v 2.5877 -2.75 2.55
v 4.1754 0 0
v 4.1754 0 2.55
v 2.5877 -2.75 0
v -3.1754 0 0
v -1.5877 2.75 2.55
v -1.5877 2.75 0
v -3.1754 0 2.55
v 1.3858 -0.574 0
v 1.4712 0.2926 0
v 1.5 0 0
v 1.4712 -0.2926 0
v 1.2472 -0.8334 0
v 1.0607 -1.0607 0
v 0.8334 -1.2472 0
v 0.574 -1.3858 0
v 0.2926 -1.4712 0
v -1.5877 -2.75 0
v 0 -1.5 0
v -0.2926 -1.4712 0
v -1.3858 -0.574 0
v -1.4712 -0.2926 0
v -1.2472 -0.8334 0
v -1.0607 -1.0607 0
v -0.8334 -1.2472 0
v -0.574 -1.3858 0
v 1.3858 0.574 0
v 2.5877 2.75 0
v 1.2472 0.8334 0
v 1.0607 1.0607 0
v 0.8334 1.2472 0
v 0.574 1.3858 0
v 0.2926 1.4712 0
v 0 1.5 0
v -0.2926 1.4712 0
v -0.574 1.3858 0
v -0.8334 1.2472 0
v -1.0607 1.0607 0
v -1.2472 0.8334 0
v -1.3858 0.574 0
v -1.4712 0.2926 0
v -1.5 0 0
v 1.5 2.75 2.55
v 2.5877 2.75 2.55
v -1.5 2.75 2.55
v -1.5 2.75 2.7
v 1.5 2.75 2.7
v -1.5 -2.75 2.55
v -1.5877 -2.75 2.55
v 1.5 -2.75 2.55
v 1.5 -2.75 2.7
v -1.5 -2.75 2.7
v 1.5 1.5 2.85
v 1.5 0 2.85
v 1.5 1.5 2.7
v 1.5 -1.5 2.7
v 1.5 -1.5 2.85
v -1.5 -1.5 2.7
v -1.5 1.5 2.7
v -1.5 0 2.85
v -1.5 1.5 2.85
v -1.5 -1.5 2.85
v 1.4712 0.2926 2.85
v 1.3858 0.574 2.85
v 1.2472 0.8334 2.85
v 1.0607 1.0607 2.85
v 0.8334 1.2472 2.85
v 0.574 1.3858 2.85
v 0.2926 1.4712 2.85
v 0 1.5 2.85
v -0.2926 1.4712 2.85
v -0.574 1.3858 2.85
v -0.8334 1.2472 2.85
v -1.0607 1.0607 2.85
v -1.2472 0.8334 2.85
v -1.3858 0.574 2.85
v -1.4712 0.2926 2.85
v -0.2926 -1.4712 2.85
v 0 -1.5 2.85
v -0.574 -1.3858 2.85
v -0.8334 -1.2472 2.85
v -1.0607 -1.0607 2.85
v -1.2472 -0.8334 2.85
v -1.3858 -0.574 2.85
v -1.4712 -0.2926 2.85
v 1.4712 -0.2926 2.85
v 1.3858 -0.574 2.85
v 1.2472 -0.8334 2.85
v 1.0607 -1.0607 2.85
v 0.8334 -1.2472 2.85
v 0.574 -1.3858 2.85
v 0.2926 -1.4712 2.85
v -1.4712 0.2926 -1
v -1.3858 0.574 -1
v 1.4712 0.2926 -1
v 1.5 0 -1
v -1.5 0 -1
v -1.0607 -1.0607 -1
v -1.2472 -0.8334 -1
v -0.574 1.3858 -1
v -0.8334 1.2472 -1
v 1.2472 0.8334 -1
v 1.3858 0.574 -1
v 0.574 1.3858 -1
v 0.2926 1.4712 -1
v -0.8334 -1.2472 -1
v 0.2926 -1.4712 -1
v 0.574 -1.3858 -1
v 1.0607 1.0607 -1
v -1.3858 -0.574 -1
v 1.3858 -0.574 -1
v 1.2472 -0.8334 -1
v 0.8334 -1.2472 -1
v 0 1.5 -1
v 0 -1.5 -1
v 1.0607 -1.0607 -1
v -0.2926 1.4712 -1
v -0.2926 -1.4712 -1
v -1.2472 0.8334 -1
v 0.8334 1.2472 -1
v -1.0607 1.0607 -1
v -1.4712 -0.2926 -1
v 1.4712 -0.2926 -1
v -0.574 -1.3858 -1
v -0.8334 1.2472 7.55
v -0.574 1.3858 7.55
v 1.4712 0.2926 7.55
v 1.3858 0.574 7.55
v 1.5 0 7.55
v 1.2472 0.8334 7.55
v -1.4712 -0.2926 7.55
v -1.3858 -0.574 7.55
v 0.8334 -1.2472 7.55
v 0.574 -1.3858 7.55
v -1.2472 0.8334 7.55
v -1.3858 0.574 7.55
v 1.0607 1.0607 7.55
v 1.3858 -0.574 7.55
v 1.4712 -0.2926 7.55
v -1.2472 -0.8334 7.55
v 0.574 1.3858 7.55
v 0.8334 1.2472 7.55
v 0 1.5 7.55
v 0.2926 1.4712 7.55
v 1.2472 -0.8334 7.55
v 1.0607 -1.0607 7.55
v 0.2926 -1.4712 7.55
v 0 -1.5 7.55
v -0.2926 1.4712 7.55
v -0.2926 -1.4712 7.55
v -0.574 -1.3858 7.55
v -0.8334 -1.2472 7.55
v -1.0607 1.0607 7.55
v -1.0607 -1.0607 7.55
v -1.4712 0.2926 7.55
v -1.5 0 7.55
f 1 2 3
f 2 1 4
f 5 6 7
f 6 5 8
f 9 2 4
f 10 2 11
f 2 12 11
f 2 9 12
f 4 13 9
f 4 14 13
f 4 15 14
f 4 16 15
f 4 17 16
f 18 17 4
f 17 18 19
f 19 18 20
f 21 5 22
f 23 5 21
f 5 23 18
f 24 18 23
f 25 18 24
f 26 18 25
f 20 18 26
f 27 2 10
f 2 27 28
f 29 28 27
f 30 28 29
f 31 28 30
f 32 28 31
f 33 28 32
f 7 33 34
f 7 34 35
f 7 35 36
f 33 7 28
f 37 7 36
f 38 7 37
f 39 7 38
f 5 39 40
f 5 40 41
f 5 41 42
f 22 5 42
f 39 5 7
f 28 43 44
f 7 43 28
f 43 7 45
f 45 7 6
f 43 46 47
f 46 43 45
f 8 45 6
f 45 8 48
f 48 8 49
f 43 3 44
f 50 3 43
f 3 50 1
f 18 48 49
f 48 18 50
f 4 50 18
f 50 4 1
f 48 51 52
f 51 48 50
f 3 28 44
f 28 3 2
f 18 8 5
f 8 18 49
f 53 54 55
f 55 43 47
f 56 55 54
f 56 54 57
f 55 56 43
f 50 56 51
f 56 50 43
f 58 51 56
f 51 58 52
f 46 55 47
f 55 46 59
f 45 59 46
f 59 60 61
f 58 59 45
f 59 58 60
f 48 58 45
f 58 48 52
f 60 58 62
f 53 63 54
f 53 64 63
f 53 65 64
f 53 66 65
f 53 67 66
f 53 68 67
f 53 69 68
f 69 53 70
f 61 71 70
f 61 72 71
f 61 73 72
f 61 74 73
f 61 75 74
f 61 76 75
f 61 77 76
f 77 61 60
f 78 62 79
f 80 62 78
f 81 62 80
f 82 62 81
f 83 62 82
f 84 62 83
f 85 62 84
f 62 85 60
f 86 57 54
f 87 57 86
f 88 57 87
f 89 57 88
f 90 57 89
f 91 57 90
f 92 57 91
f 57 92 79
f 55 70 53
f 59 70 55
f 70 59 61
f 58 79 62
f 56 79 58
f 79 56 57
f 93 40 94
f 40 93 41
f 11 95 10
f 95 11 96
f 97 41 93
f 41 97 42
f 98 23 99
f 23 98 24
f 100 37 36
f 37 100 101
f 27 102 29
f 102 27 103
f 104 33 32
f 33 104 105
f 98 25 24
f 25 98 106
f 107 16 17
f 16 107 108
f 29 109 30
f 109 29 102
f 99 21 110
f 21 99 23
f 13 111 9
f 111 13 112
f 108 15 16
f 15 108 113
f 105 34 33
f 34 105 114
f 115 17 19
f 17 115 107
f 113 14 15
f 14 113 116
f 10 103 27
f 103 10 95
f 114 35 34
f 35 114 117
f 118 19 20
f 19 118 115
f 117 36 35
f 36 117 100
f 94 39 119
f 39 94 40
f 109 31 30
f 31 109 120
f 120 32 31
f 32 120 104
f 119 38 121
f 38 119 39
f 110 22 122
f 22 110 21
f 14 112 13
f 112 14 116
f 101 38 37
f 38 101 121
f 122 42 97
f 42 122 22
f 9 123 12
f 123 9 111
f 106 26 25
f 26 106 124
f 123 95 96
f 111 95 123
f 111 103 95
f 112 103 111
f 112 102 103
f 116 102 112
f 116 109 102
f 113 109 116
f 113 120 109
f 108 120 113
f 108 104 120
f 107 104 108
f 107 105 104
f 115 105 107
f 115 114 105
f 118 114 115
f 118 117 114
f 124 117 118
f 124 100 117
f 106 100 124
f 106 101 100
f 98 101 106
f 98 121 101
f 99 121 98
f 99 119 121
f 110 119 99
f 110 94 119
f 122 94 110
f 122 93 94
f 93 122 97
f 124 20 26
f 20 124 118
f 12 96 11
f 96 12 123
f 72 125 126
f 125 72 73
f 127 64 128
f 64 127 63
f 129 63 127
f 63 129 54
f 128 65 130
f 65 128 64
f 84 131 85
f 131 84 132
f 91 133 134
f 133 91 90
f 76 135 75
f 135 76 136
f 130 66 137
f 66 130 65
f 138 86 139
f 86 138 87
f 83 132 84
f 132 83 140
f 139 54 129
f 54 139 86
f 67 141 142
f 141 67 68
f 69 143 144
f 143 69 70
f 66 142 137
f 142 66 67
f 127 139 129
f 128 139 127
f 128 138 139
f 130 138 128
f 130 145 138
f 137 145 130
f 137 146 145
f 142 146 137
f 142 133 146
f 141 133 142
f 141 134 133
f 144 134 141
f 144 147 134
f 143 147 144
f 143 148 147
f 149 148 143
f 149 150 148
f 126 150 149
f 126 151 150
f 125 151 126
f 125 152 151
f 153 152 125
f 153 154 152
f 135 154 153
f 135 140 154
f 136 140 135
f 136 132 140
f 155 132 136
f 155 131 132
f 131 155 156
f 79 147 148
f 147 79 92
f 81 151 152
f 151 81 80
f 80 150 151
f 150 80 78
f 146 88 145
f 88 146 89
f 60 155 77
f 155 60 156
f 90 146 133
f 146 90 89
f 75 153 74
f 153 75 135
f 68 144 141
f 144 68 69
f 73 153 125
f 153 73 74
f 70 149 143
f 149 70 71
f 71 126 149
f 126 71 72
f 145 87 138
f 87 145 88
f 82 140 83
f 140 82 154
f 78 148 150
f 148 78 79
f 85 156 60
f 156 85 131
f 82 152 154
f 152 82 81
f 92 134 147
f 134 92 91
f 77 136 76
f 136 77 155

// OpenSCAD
// file: Utils.scad
module mirror_copy(vec=undef) {
    children();
    mirror(vec) children();
}

function dot_product(v1, v2) =
    let(
        max_dim = max(len(v1), len(v2)),
        v1_eff = len(v1) < max_dim ? concat(v1, [for (i = [0 : max_dim - len(v1) - 1]) 0]) : v1,
        v2_eff = len(v2) < max_dim ? concat(v2, [for (i = [0 : max_dim - len(v2) - 1]) 0]) : v2
    )
    (max_dim == 2) ? (v1_eff[0]*v2_eff[0] + v1_eff[1]*v2_eff[1]) :
    (max_dim == 3) ? (v1_eff[0]*v2_eff[0] + v1_eff[1]*v2_eff[1] + v1_eff[2]*v2_eff[2]) :
    0;

function mirror_single_point(p, n) =
    let(
        p_dim = len(p),
        p_calc = (p_dim == 2 && len(n) == 3) ? [p[0], p[1], 0] : p,
        n_calc = (len(n) == 2 && p_dim == 3) ? [n[0], n[1], 0] : n,
        n_norm = (norm(n_calc) == 0) ? n_calc : n_calc / norm(n_calc),
        proj_scalar = dot_product(p_calc, n_norm),
        reflection_vec = [
            2 * proj_scalar * n_norm[0],
            2 * proj_scalar * n_norm[1],
            (len(n_norm) == 3 ? 2 * proj_scalar * n_norm[2] : 0) 
        ]
    )
    (p_dim == 2) ? [
        p[0] - reflection_vec[0],
        p[1] - reflection_vec[1]
    ] : [
        p[0] - reflection_vec[0],
        p[1] - reflection_vec[1],
        p[2] - reflection_vec[2]
    ];


function copy_mirror_points(points, vec = [1, 0, 0]) =
    let(
        mirrored_points = [ for (p = points) mirror_single_point(p, vec) ],
        reversed_mirrored_points = [
            for (i = [len(mirrored_points) - 1 : -1 : 0]) mirrored_points[i]
        ]
    )
    // Step 3: Concatenate the original points with the reversed and mirrored points
    concat(points, reversed_mirrored_points);

module Hex(d) {
    intersection_for(a = [0, 120, 240]) rotate(a) square([d * 2, d], true);
}
        
// main file
use <Utils.scad>

M3HexHole_Horizontal(slide = 1);

module M3HexHole_Horizontal(l1 = 1.0, l2 = 5.0, layer_height = 0.15, slide = 0, height_tolerance = undef) {
    HexNutHoleHorizontal(
        hole_diameter = 3.0,
        nut_diameter  = 5.5,
        nut_height    = 2.4,
        l1            = l1,
        l2            = l2,
        layer_height  = layer_height,
        slide         = slide,
        height_tolerance = height_tolerance);
}

module HexNutHoleHorizontal(
    hole_diameter, nut_diameter, nut_height, l1, l2, layer_height = 0.15, slide = 0, height_tolerance = undef, $fn=32
) {
    height = nut_height + (
        (height_tolerance == undef) ? (
            (slide == 0) ? 0 : layer_height
        ) : (
            height_tolerance
        )
    );
    linear_extrude(height) {
        if(slide == 0) { 
            Hex(nut_diameter);
        } else {
            hull() {
                Hex(nut_diameter);
                translate([slide, 0, 0]) Hex(nut_diameter);
            }
        }
    }
    linear_extrude(height + layer_height) {
        intersection() {
            square([hole_diameter, nut_diameter], center=true);
            Hex(nut_diameter);
        }
    }
    linear_extrude(height + 2 * layer_height) {
        square(hole_diameter, center=true);
    }
    mirror([0, 0, 1]) cylinder(d = hole_diameter, l1);
    cylinder(d = hole_diameter, l2 + height);
}
